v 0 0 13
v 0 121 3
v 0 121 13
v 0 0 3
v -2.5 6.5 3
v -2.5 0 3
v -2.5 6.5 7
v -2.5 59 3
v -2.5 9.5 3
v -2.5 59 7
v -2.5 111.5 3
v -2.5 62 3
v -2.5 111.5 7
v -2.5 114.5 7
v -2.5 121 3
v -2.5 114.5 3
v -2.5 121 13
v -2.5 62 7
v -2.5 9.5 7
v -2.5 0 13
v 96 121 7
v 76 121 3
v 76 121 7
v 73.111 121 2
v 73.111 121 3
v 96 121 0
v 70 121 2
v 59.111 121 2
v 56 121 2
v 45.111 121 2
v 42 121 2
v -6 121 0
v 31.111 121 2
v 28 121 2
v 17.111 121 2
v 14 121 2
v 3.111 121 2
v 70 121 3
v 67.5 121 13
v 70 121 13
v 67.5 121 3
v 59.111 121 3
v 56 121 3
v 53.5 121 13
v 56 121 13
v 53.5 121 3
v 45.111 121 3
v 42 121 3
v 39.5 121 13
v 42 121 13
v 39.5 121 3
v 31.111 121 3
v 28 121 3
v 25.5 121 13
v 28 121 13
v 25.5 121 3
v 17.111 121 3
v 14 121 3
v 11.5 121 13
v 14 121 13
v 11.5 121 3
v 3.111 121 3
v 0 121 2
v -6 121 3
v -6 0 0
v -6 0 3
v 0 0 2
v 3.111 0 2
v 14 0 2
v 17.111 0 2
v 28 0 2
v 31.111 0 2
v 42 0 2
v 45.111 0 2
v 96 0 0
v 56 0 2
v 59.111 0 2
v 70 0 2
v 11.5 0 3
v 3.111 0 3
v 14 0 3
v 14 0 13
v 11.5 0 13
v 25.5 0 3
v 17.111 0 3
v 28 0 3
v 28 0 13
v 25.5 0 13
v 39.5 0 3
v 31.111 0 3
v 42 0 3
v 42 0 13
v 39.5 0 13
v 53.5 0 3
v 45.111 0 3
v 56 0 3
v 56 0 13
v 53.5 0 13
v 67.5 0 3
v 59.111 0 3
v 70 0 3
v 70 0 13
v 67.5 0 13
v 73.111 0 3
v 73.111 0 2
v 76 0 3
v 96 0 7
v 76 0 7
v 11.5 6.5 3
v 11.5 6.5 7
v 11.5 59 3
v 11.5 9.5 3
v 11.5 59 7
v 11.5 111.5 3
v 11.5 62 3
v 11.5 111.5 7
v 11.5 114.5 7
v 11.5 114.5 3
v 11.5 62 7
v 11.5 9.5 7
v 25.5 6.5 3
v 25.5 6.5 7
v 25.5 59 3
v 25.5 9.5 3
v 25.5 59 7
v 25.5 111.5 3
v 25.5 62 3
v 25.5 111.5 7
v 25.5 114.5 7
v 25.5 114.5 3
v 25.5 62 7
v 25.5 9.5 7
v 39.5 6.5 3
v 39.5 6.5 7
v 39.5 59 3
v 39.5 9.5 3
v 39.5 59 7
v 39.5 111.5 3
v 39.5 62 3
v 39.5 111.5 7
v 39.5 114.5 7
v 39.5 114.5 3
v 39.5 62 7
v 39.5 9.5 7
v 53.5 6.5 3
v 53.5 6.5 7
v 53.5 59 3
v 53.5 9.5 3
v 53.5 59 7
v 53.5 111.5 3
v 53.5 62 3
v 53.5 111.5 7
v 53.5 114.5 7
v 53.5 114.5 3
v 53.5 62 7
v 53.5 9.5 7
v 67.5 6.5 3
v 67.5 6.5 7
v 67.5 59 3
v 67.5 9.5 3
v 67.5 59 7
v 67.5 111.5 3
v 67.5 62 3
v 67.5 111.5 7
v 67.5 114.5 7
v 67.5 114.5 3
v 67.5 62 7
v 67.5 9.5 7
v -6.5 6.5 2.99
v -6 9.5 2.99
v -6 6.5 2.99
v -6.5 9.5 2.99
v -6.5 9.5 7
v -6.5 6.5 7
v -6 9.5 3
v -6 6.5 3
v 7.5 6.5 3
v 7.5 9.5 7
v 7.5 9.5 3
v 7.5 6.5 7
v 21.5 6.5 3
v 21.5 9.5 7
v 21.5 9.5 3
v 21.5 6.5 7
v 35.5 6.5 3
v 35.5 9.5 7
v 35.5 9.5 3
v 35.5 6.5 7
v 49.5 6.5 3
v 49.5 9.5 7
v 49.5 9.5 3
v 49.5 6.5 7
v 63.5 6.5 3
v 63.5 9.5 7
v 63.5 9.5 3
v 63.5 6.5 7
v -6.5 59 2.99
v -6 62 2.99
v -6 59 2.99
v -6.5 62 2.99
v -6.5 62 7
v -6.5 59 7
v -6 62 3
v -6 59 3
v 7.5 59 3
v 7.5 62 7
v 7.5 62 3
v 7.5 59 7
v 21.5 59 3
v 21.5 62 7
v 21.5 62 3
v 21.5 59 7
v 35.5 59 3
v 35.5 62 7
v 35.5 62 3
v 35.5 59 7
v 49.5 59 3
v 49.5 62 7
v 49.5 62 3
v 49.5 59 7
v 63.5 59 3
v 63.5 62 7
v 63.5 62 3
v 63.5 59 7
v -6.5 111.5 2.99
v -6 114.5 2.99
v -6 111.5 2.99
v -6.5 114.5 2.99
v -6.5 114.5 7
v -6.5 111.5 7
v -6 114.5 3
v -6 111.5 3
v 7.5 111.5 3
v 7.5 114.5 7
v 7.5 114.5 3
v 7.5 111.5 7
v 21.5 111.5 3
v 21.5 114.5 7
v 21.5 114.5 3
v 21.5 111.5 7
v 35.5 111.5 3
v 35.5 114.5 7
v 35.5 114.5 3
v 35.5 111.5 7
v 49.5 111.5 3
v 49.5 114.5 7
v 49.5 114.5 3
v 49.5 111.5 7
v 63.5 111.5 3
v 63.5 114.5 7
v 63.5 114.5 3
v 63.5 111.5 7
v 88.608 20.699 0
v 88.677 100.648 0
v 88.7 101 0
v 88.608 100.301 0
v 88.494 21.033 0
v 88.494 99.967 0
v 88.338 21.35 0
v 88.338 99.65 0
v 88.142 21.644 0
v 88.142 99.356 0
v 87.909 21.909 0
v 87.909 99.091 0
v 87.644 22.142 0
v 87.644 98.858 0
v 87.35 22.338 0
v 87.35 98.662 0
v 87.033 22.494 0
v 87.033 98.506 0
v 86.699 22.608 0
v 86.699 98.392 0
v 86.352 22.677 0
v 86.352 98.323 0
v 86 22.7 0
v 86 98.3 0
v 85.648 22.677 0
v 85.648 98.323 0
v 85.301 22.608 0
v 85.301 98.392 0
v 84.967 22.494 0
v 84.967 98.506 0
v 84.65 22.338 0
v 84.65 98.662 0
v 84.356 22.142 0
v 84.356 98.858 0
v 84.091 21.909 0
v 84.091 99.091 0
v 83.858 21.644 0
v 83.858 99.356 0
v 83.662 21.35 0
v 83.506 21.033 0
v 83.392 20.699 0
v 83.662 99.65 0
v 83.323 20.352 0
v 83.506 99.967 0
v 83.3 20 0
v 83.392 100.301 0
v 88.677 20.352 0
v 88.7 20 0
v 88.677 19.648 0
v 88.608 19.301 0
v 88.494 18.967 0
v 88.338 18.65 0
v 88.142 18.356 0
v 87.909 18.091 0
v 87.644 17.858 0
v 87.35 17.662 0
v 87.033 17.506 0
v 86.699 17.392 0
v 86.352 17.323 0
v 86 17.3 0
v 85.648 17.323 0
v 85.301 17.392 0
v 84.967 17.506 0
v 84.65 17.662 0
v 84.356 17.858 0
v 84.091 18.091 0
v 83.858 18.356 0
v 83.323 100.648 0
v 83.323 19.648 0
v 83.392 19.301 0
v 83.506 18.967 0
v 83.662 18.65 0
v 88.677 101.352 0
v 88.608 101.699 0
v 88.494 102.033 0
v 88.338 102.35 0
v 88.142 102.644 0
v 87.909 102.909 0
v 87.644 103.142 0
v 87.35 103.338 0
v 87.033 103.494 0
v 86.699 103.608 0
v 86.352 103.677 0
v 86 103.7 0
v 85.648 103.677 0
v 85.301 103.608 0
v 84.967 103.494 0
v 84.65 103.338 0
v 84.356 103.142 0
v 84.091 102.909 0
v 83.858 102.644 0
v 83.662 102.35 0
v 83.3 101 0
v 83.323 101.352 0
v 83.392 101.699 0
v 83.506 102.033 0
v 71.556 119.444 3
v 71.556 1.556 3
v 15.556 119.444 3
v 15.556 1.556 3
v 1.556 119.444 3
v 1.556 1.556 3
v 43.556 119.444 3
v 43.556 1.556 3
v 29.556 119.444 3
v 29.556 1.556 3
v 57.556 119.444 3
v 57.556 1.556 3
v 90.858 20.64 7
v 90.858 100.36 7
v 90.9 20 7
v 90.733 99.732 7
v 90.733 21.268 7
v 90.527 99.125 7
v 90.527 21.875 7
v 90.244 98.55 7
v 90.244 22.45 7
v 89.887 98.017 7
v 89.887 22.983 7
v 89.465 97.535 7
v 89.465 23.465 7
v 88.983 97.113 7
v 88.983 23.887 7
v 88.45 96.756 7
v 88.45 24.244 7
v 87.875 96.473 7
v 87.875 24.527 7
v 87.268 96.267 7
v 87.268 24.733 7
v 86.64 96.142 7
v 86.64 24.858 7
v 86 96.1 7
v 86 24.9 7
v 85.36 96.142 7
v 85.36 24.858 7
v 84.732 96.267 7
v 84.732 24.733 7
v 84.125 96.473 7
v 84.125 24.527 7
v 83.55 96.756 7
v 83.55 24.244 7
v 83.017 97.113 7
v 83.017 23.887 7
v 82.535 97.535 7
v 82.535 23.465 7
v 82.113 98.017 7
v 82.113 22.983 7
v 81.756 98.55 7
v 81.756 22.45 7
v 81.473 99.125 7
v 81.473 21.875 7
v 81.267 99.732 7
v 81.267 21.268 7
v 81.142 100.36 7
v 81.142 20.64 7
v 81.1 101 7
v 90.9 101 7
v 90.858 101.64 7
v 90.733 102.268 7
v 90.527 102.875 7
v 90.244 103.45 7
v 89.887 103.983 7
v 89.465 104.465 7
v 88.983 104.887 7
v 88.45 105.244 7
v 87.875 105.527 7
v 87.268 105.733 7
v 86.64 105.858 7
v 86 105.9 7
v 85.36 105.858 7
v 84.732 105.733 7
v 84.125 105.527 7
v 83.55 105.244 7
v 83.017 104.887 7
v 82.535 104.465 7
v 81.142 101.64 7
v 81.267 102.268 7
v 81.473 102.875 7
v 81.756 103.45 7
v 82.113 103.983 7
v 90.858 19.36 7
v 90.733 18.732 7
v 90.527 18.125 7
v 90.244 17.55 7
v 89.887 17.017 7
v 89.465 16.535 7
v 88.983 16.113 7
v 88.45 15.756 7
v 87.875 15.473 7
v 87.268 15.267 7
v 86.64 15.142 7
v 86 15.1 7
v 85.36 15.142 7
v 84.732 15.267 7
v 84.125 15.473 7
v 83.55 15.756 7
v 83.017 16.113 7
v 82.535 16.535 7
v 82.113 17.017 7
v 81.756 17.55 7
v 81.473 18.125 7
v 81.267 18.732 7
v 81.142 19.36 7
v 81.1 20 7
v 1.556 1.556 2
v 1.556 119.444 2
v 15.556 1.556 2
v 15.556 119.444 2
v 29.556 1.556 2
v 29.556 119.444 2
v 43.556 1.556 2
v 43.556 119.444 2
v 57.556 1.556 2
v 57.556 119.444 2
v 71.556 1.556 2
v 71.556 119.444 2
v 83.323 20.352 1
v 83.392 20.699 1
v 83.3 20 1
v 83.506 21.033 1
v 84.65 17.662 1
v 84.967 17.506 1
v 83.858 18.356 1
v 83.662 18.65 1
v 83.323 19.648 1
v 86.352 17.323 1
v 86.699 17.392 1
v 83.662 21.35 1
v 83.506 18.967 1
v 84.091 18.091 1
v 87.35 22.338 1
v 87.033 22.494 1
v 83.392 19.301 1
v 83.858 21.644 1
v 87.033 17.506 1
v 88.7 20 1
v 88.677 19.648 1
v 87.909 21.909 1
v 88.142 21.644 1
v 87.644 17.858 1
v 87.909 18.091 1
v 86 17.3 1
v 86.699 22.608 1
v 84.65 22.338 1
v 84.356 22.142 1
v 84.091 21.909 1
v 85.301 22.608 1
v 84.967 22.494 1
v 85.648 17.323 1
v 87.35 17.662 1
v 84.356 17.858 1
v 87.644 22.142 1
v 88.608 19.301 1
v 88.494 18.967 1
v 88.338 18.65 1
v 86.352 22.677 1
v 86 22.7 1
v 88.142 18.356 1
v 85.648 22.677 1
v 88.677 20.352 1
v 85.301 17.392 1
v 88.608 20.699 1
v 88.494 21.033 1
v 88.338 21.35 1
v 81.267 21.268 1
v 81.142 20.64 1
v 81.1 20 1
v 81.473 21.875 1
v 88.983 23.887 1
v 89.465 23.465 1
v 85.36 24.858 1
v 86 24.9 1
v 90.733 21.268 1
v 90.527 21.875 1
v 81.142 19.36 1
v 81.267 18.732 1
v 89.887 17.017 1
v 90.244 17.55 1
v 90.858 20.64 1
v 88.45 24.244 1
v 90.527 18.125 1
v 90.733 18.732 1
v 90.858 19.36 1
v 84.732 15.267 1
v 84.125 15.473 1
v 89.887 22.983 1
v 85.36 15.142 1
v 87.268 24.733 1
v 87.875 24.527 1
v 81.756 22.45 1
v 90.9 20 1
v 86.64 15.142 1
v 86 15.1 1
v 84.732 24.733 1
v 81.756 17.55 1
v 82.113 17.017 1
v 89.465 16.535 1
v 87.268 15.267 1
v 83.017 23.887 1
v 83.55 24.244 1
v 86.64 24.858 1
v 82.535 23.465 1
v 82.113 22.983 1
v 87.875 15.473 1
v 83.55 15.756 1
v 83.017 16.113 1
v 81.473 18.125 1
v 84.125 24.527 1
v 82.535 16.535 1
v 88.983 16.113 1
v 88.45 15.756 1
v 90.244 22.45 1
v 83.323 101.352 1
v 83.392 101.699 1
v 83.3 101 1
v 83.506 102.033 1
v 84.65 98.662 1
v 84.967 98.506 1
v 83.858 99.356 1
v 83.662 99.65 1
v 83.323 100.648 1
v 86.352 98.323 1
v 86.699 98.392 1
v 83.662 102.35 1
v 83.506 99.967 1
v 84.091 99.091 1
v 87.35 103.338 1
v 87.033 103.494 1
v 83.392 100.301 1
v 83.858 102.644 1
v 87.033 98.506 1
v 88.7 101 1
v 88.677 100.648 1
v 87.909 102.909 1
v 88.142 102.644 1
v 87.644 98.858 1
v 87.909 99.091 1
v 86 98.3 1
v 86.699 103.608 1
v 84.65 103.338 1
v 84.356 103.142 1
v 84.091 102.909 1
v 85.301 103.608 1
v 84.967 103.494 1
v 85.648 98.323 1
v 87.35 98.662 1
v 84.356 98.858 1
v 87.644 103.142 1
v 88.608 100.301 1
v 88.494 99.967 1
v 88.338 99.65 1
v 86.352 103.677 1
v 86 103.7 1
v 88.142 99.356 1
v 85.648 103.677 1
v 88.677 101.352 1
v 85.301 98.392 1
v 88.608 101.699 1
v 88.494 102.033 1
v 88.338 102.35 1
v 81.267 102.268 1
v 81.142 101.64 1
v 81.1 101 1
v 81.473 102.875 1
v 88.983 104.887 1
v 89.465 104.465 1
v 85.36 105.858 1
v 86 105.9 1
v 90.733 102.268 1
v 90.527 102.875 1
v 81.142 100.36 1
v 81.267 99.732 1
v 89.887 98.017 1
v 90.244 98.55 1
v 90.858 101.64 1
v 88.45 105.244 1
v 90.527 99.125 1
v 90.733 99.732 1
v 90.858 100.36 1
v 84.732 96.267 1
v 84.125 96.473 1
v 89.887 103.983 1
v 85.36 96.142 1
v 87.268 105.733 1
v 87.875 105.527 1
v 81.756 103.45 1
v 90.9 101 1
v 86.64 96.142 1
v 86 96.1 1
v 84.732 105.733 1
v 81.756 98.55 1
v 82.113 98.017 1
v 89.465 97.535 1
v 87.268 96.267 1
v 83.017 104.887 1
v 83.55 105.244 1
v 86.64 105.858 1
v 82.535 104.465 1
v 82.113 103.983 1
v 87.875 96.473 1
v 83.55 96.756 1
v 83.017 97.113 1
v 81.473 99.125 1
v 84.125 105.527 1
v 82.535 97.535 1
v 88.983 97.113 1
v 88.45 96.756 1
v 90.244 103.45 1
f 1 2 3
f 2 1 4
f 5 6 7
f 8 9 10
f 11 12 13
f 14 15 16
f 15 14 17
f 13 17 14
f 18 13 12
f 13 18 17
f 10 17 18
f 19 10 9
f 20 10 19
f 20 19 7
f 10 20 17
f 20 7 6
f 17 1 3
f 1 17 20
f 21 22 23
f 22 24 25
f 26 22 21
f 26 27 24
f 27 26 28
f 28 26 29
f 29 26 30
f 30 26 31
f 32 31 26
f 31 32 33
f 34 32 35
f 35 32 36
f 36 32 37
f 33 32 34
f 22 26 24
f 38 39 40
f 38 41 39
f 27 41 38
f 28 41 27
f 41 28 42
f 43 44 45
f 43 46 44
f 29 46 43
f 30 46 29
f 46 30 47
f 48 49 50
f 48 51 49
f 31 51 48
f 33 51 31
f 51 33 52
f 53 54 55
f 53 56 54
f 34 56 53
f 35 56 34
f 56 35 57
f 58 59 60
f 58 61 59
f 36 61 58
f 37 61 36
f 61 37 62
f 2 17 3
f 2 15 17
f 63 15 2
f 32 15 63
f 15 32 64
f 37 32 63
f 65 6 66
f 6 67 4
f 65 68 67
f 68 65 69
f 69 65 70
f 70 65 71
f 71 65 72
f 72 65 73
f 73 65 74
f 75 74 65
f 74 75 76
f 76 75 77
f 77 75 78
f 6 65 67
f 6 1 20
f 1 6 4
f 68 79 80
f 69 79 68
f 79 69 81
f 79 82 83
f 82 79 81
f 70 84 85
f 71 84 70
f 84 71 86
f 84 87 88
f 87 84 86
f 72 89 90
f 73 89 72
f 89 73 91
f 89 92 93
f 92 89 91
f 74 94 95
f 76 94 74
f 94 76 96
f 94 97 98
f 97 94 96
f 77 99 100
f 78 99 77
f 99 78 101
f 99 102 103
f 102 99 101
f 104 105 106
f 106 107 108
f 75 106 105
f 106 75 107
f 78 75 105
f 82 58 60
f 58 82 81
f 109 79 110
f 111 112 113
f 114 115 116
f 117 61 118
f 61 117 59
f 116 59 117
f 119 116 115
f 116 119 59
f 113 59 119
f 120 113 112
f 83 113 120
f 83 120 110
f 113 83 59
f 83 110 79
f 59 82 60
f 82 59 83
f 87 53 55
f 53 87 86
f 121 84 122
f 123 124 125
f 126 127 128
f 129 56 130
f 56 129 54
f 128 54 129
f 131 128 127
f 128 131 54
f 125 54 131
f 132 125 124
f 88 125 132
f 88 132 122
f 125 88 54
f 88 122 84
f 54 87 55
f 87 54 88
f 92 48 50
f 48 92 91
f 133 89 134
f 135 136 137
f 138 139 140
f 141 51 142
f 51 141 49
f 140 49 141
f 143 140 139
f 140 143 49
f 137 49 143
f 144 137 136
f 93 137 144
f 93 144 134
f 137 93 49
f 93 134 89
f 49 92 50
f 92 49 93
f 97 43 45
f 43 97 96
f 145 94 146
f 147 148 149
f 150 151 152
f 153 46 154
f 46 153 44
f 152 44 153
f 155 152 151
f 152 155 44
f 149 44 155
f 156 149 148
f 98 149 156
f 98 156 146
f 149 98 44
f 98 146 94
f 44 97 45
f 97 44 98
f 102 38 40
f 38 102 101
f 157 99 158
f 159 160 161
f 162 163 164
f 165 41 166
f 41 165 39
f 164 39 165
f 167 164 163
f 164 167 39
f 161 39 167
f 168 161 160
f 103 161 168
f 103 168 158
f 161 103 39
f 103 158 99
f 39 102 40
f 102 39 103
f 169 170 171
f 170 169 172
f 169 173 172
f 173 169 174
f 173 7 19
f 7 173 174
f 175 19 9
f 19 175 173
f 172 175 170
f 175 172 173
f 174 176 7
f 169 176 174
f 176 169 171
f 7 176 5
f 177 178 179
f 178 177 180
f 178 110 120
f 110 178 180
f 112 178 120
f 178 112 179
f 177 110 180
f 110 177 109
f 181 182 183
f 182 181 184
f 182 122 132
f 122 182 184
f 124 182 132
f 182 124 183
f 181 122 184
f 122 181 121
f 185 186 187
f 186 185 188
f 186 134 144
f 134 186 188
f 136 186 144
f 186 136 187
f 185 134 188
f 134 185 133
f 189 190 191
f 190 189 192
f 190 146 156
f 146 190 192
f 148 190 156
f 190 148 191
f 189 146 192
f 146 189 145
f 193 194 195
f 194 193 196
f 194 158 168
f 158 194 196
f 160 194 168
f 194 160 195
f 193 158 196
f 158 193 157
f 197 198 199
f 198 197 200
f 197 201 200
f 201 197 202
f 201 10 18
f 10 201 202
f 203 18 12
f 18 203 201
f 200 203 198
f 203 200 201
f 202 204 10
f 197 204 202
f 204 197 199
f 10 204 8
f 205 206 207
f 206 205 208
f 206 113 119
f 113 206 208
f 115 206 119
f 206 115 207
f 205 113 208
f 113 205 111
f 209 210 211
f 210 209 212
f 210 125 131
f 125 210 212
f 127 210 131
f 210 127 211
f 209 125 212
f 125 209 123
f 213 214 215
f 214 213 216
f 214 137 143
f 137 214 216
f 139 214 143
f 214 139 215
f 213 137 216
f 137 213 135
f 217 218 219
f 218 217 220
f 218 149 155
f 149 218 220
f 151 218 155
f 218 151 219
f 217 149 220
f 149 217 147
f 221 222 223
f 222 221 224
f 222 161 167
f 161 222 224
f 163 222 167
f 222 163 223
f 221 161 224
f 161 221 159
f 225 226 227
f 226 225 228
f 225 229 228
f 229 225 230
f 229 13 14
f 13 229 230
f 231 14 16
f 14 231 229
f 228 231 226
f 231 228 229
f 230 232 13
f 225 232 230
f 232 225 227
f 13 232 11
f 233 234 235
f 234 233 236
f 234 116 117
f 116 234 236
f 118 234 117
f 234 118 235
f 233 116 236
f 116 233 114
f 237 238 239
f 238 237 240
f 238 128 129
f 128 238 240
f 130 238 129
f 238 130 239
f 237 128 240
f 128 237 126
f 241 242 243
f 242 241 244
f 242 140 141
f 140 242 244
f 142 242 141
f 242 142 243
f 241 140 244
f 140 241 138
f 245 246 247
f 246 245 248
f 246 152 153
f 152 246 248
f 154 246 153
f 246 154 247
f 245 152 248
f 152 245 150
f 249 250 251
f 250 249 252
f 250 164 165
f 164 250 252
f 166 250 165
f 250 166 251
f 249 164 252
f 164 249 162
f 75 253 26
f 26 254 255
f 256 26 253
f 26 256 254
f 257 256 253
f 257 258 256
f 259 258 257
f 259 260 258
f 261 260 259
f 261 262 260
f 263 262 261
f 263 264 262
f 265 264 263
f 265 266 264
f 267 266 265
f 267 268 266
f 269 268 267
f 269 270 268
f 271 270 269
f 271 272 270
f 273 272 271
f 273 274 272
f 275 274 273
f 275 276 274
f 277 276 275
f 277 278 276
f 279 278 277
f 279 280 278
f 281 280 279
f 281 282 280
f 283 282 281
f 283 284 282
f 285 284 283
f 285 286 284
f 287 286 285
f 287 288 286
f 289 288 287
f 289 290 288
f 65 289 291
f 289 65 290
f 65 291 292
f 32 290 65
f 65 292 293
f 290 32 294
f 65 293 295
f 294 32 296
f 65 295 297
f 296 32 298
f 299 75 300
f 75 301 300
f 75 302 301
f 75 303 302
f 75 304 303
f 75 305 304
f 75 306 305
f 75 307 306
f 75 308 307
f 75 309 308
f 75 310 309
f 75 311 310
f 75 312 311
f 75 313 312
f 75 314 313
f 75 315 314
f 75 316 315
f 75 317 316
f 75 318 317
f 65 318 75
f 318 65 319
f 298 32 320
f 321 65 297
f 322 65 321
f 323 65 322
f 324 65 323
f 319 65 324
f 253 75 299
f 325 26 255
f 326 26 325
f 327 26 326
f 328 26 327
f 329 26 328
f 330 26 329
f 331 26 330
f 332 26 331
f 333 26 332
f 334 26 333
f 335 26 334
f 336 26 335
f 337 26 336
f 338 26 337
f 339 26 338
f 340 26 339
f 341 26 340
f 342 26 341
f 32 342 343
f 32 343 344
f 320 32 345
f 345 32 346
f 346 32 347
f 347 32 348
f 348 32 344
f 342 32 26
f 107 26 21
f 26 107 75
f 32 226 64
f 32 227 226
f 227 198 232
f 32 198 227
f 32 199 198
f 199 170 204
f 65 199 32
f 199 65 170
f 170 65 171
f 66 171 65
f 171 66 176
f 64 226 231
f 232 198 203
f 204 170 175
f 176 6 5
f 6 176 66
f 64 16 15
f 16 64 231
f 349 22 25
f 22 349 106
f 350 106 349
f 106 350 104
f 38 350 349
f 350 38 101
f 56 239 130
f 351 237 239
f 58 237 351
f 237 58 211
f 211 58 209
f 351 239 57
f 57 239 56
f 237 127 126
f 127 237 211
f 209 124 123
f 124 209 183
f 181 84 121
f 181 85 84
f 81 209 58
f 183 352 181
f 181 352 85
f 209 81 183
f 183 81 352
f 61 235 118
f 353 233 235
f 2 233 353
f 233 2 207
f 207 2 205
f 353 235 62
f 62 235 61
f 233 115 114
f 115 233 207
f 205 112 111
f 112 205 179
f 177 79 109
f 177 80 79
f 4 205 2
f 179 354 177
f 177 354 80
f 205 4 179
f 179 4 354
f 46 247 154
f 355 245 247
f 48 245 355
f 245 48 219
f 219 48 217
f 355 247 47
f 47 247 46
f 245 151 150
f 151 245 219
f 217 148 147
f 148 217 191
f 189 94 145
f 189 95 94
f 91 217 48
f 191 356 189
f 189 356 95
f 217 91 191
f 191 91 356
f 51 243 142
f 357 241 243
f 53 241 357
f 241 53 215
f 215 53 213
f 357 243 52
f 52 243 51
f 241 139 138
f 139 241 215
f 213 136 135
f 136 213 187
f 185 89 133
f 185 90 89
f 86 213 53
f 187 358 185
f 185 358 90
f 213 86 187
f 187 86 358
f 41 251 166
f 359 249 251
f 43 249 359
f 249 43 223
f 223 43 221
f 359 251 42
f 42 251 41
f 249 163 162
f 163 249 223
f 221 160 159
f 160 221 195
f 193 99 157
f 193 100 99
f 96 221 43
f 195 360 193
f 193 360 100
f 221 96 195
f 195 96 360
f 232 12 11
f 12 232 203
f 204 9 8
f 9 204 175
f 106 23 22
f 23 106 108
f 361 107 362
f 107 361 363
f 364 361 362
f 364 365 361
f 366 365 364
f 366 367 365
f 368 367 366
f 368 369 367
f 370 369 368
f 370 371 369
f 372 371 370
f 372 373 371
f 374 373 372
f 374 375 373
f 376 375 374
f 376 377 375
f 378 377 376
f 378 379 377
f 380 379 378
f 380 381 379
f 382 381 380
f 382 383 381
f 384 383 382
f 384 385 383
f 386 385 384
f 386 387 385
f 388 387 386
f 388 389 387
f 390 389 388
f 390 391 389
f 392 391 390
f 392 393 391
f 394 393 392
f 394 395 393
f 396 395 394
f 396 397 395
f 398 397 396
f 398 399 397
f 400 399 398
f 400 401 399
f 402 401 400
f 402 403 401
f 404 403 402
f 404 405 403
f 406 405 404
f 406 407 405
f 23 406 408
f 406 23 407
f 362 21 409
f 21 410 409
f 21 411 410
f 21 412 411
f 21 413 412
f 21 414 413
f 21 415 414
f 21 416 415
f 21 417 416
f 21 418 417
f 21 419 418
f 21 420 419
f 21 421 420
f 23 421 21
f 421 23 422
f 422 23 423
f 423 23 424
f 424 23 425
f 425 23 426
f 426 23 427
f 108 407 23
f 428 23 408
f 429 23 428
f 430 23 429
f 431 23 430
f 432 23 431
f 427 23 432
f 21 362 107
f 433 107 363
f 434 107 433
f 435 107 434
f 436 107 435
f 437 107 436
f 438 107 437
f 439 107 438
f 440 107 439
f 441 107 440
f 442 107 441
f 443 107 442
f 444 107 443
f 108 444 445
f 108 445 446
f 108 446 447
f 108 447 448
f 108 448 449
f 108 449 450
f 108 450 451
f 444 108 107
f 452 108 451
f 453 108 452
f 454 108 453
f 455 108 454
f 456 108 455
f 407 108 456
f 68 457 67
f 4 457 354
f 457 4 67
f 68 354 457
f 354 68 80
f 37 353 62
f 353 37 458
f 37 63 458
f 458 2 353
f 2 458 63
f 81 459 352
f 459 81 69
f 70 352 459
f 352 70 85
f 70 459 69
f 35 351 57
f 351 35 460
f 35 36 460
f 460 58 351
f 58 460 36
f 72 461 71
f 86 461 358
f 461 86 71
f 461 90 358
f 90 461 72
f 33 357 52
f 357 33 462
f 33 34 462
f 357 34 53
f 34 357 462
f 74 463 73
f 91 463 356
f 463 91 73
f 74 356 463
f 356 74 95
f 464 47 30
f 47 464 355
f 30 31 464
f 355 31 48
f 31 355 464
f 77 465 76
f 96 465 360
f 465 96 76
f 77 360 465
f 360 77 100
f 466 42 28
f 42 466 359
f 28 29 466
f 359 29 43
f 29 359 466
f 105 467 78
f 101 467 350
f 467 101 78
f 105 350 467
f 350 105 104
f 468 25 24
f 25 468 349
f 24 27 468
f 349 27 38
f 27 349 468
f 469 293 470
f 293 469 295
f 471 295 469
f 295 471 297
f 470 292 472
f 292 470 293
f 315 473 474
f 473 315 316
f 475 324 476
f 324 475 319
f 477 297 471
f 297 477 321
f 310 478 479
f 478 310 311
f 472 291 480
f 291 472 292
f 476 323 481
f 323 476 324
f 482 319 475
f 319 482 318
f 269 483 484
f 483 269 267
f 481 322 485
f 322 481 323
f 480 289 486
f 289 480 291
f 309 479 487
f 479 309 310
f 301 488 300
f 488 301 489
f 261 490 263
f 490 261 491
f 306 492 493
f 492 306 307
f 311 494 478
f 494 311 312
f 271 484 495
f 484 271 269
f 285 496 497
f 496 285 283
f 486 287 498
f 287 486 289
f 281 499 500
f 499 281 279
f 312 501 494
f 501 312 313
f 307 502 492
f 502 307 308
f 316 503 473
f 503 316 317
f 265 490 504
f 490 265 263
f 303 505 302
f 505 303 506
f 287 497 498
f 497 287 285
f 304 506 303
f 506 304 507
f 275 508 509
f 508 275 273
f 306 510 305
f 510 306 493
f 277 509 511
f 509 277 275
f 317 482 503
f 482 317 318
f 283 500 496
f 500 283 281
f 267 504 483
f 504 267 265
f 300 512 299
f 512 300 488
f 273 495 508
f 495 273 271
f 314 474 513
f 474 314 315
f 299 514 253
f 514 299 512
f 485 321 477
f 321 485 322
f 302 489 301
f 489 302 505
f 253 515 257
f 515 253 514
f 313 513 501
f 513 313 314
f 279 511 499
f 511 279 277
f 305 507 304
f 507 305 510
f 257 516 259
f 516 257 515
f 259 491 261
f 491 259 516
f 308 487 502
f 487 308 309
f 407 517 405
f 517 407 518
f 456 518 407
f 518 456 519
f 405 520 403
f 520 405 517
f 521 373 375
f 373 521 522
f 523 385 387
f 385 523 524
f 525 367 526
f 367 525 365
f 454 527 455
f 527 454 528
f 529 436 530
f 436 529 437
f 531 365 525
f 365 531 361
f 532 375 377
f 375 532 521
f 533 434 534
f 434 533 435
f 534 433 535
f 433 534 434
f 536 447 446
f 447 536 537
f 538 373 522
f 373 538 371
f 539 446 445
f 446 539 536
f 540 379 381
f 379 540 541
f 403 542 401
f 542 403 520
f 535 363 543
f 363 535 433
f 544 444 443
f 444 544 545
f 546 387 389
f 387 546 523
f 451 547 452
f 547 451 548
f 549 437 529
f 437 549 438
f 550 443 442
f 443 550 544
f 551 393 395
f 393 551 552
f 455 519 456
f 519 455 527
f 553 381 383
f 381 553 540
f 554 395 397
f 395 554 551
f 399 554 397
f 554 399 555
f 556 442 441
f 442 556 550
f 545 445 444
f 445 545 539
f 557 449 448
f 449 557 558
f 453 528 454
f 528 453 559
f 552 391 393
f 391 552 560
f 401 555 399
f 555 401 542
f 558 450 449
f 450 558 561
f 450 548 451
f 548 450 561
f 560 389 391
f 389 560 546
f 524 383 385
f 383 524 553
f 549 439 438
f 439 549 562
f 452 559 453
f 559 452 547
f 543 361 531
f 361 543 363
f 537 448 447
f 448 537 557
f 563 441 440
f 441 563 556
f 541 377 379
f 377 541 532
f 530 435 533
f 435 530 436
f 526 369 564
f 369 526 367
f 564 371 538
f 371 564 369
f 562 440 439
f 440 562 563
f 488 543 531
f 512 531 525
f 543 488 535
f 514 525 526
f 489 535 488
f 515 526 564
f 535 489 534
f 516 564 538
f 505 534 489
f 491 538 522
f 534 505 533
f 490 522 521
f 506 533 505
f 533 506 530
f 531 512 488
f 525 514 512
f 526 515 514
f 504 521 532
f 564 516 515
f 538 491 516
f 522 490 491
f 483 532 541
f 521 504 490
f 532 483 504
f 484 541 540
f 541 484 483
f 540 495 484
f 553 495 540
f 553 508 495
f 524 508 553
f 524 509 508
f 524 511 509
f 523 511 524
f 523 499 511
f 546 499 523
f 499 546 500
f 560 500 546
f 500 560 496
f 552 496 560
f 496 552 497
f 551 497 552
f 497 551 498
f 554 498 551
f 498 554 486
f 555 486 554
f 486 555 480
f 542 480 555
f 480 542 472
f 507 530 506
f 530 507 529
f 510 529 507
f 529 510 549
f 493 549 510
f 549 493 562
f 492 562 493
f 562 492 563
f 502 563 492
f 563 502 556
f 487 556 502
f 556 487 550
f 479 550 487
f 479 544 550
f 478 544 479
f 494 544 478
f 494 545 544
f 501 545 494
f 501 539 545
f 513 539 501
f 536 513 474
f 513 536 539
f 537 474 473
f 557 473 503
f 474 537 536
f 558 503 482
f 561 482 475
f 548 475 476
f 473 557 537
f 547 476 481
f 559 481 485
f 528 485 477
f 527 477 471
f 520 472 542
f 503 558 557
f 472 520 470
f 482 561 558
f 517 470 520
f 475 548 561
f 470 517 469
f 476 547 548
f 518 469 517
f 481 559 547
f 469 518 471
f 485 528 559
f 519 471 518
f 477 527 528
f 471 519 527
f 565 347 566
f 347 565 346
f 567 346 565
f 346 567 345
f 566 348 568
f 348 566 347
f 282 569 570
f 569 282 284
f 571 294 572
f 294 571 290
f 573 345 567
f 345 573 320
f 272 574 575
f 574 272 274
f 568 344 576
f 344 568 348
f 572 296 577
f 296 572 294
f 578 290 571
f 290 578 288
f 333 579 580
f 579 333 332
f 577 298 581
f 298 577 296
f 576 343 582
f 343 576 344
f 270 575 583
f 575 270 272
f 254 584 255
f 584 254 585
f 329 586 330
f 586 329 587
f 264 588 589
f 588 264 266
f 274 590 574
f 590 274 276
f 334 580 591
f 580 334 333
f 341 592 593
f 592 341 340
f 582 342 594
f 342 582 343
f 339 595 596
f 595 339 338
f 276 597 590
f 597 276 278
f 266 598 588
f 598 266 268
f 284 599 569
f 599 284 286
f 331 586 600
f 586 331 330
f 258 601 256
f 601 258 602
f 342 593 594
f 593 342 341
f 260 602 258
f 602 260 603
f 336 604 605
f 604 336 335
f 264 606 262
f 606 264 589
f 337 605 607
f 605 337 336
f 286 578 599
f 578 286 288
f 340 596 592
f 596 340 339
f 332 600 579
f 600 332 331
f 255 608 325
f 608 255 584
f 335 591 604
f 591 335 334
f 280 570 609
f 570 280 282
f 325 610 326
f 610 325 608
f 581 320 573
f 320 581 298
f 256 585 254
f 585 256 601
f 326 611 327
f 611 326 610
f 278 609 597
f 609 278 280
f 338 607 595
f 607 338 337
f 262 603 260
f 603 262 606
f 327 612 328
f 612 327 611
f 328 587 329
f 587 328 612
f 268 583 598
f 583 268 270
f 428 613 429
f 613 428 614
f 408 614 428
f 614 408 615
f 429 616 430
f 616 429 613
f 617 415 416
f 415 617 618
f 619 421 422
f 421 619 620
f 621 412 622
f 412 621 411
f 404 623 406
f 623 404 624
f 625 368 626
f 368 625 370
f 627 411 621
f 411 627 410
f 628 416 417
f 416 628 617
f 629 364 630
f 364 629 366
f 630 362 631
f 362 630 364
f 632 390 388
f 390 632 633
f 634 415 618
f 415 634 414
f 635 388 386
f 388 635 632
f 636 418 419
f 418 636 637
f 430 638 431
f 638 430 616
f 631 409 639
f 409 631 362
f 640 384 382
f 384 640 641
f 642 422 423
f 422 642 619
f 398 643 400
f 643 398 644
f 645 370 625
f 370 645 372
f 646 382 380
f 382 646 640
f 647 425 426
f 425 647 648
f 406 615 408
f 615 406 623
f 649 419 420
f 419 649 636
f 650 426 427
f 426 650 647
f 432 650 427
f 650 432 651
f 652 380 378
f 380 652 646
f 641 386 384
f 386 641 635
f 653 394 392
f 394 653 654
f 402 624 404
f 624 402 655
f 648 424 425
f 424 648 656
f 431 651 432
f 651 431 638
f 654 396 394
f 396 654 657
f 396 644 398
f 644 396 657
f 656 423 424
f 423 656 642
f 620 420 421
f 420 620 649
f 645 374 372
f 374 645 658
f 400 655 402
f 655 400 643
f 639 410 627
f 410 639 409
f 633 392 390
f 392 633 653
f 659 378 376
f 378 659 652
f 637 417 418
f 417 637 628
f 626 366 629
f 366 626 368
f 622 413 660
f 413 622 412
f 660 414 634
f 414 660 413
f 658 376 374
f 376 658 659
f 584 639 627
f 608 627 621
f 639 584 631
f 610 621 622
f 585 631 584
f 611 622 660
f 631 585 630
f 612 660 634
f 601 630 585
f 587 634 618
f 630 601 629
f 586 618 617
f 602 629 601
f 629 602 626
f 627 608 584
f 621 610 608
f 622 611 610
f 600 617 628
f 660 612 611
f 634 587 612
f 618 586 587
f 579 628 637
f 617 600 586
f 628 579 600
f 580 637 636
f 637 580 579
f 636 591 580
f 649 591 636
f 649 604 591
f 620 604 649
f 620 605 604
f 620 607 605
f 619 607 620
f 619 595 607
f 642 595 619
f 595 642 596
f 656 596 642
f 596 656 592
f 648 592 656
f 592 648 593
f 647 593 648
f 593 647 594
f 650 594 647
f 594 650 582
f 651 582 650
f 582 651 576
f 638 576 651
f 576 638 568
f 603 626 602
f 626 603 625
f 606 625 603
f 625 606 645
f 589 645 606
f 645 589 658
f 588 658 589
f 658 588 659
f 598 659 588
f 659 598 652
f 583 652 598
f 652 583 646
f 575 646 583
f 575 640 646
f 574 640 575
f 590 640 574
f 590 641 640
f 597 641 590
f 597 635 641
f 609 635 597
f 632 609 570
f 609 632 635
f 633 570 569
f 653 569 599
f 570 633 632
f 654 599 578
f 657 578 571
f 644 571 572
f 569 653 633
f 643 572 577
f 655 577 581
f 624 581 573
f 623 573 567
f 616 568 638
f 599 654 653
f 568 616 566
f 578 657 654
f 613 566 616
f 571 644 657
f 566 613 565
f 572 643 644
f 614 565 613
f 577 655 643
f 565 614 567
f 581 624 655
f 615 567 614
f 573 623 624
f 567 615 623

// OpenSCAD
// file: lib/comun.scad
// =====================================================================
// AutoSwapEnder3Pro - parametros y utilidades comunes de las piezas
// Licencia MIT. Unidades: milimetros.
//
// Sistema de coordenadas de la ESTACION (el mismo en todas las piezas que
// se montan en ella):
//   s : a lo largo de la estacion, 0 = HOME del carro, crece hacia la impresora
//   x : a lo ancho, 0 = eje central (riel lineal), +x = lado de la caja de descarga
//   z : vertical, 0 = cara superior de la base de perfiles 2020 ("b" en la guia)
// El plano de transferencia (superficie por la que se deslizan las placas)
// esta en z = PLANO. Se ajusta a la altura de la cama de la impresora con las
// patas niveladoras, NO cambiando estas piezas.
// =====================================================================

$fn = 48;

// ----------------------------------------------------- placas y cama
placa_ancho  = 235;     // placa PEI
placa_largo  = 235;
placa_esp    = 0.6;     // espesor real de tus placas (mide con calibrador; 0.5 a 0.75)
voladizo     = 11;      // cuanto sobresale la placa (o su lengüeta) por delante de la cama

// ----------------------------------------------------- estacion (alturas sobre la base)
PLANO        = 60;      // plano de transferencia sobre la cara superior de la base
RIEL_SUP     = 20;      // cara superior del riel lineal (2020 apoyado en los travesaños)
ZP           = PLANO - RIEL_SUP;  // = 40: plano de transferencia sobre el riel lineal

// zapata (debe coincidir con zapata.scad)
zapata_bajo  = 8;       // cuanto cuelga la zapata por debajo de la placa
zapata_bolsillo = 6;    // profundidad del bolsillo para el dedo (desde abajo)

// cargador (ascensor)
paso_estante = 14;      // distancia vertical entre placas en el cargador
niveles      = 6;       // placas que caben en el cargador

// ----------------------------------------------------- perfil y tornilleria
perfil      = 20;       // perfil de aluminio 2020
ranura_ancho = 6.2;     // boca de la ranura (serie 20)
holgura     = 0.3;      // holgura general de impresion

m2_paso     = 1.8;   // agujero para autorroscante M2 (servos)
m3          = 3.4;   // paso libre M3
m3_rosca    = 2.7;   // para roscar M3 directamente en plastico
m3_tuerca   = 5.7;   // M3: entre caras + holgura
m3_tuerca_h = 2.6;
m3_cabeza   = 6.2;
m4          = 4.4;
m5          = 5.4;   // paso libre M5
m5_cabeza   = 9.2;
m5_tuerca   = 8.2;   // M5: entre caras + holgura

// ruedas en V estandar (Openbuilds "Solid V Wheel" + rodamientos 625)
rueda_d      = 23.9;
rueda_ancho  = 10.2;
rueda_sep    = 39.26;   // distancia entre centros de ruedas a ambos lados de un 2020
excentrica_d = 7.2;     // alojamiento del espaciador excentrico
espaciador_h = 6;       // espaciador (excentrico o fijo) entre rueda y placa

// ----------------------------------------------------- utilidades

// Caja con aristas verticales redondeadas (r) apoyada en z=0.
module caja_r(size, r = 2) {
  r2 = min(r, size[0] / 2 - 0.01, size[1] / 2 - 0.01);
  hull() for (ix = [r2, size[0] - r2], iy = [r2, size[1] - r2])
    translate([ix, iy, 0]) cylinder(r = r2, h = size[2]);
}

// Igual pero centrada en x e y.
module caja_rc(size, r = 2) { translate([-size[0] / 2, -size[1] / 2, 0]) caja_r(size, r); }

// Prisma hexagonal para tuercas (ec = medida entre caras).
module hexagono(ec, h) { cylinder(d = ec / cos(30), h = h, $fn = 6); }

// Ranura (agujero alargado) a lo largo de x.
module ranura(largo, d, h) {
  hull() for (i = [-largo / 2, largo / 2]) translate([i, 0, 0]) cylinder(d = d, h = h);
}

// Taladro M5 con avellanado para la cabeza (para atornillar a un perfil con tuerca en T).
module taladro_m5(h, cabeza = 4) {
  translate([0, 0, -0.1]) cylinder(d = m5, h = h + 0.2);
  translate([0, 0, h - cabeza]) cylinder(d = m5_cabeza + 0.6, h = cabeza + 0.1);
}

// Taladro M3 pasante con alojamiento de tuerca hexagonal por debajo.
module taladro_m3_tuerca(h, prof_tuerca = m3_tuerca_h + 0.2) {
  translate([0, 0, -0.1]) cylinder(d = m3, h = h + 0.2);
  translate([0, 0, -0.1]) hexagono(m3_tuerca, prof_tuerca + 0.1);
}

// Perfil 2020 de referencia (solo para ensamble y comprobaciones visuales).
module perfil2020(largo) {
  difference() {
    translate([-10, -10, 0]) cube([20, 20, largo]);
    for (a = [0, 90, 180, 270]) rotate([0, 0, a])
      translate([10 - 1.8, -ranura_ancho / 2, -1]) cube([2, ranura_ancho, largo + 2]);
    translate([0, 0, -1]) cylinder(d = 4.2, h = largo + 2);
  }
}

// Microinterruptor KW11-3Z con palanca de rodillo (referencia: 20 x 6.4 x 10 mm,
// taladros M2 a 9.5 mm). Agujeros de montaje, con la cara de montaje en z=0.
module taladros_kw11(h = 10) {
  for (i = [-4.75, 4.75]) translate([i, 0, -0.1]) cylinder(d = 2.2, h = h + 0.2);
}
// main file
// =====================================================================
// PEINE DEL CARGADOR - paredes con estantes donde descansan las placas limpias
// Material: PETG. 3 perimetros, 25 %. Imprimir 4: 2 derechos y 2 izquierdos
// (lado = "der" | "izq"); cada lado son 2 tramos de 121 mm.
// Imprimir tumbado sobre la cara exterior (los estantes quedan hacia arriba).
//
// Cada placa apoya sus margenes laterales (8 mm) sobre un estante. Paso vertical
// 14 mm: la zapata (8 mm por debajo y 1.85 por encima de su placa) nunca toca la
// placa de arriba. El ascensor baja el peine de 14 en 14 mm para dejar cada placa
// a la altura del plano de transferencia. Pegar PTFE en los estantes es opcional.
//
// Coordenadas: x de la estacion (lado derecho, x > 0), s local (0..largo),
// z local = 0 en la cara superior del estante 0 (el mas bajo).
// Arriba se atornilla al perfil 2020 longitudinal del ascensor (x 122-142).
// =====================================================================
include <lib/comun.scad>

lado  = "der";
largo = 121;
cara  = 119;          // cara interior de la pared (la placa llega a 117.5)
estante = [10, 2.5];  // vuelo hacia el centro y espesor
pared = 3;
z_perfil = paso_estante * (niveles - 1) + 6;   // cara inferior del perfil del ascensor
alto = z_perfil + 20;

module peine() {
  difference() {
    union() {
      // pared
      translate([cara, 0, -6]) cube([pared, largo, alto + 6]);
      // estantes
      for (k = [0 : niveles - 1]) translate([cara - estante[0], 0, k * paso_estante - estante[1]])
        cube([estante[0] + 0.01, largo, estante[1]]);
      // refuerzos verticales (cada 30 mm) debajo de cada estante
      for (s = [8, largo / 2, largo - 8], k = [0 : niveles - 1])
        translate([cara - 4, s - 1.5, k * paso_estante - estante[1] - 4]) cube([4.01, 3, 4]);
      // zona de atornillado al perfil (engrosada hacia dentro, por encima de todas las placas)
      translate([cara - 4, 0, z_perfil]) cube([pared + 4, largo, 20]);
    }
    // chaflanes de entrada/salida en cada estante (la placa entra y sale sin tropezar)
    for (k = [0 : niveles - 1], s = [0, largo]) translate([cara - estante[0] - 1, s, k * paso_estante])
      rotate([45, 0, 0]) cube([estante[0] + 2, 2.2, 2.2], center = false);
    // tornillos M5 al perfil (cabeza hacia dentro, por encima de todas las placas)
    for (s = [20, largo - 20]) translate([cara - 1, s, z_perfil + 10]) rotate([0, 90, 0]) {
      cylinder(d = m5, h = 20);
      translate([0, 0, -10]) cylinder(d = m5_cabeza + 0.6, h = 10 + 3);
    }
  }
}

module colocado() { if (lado == "der") peine(); else mirror([1, 0, 0]) peine(); }

// Orientacion de impresion: la cara exterior apoyada en la cama
rotate([0, lado == "der" ? 90 : -90, 0]) translate([lado == "der" ? -(cara + pared) : cara + pared, 0, 0]) colocado();
